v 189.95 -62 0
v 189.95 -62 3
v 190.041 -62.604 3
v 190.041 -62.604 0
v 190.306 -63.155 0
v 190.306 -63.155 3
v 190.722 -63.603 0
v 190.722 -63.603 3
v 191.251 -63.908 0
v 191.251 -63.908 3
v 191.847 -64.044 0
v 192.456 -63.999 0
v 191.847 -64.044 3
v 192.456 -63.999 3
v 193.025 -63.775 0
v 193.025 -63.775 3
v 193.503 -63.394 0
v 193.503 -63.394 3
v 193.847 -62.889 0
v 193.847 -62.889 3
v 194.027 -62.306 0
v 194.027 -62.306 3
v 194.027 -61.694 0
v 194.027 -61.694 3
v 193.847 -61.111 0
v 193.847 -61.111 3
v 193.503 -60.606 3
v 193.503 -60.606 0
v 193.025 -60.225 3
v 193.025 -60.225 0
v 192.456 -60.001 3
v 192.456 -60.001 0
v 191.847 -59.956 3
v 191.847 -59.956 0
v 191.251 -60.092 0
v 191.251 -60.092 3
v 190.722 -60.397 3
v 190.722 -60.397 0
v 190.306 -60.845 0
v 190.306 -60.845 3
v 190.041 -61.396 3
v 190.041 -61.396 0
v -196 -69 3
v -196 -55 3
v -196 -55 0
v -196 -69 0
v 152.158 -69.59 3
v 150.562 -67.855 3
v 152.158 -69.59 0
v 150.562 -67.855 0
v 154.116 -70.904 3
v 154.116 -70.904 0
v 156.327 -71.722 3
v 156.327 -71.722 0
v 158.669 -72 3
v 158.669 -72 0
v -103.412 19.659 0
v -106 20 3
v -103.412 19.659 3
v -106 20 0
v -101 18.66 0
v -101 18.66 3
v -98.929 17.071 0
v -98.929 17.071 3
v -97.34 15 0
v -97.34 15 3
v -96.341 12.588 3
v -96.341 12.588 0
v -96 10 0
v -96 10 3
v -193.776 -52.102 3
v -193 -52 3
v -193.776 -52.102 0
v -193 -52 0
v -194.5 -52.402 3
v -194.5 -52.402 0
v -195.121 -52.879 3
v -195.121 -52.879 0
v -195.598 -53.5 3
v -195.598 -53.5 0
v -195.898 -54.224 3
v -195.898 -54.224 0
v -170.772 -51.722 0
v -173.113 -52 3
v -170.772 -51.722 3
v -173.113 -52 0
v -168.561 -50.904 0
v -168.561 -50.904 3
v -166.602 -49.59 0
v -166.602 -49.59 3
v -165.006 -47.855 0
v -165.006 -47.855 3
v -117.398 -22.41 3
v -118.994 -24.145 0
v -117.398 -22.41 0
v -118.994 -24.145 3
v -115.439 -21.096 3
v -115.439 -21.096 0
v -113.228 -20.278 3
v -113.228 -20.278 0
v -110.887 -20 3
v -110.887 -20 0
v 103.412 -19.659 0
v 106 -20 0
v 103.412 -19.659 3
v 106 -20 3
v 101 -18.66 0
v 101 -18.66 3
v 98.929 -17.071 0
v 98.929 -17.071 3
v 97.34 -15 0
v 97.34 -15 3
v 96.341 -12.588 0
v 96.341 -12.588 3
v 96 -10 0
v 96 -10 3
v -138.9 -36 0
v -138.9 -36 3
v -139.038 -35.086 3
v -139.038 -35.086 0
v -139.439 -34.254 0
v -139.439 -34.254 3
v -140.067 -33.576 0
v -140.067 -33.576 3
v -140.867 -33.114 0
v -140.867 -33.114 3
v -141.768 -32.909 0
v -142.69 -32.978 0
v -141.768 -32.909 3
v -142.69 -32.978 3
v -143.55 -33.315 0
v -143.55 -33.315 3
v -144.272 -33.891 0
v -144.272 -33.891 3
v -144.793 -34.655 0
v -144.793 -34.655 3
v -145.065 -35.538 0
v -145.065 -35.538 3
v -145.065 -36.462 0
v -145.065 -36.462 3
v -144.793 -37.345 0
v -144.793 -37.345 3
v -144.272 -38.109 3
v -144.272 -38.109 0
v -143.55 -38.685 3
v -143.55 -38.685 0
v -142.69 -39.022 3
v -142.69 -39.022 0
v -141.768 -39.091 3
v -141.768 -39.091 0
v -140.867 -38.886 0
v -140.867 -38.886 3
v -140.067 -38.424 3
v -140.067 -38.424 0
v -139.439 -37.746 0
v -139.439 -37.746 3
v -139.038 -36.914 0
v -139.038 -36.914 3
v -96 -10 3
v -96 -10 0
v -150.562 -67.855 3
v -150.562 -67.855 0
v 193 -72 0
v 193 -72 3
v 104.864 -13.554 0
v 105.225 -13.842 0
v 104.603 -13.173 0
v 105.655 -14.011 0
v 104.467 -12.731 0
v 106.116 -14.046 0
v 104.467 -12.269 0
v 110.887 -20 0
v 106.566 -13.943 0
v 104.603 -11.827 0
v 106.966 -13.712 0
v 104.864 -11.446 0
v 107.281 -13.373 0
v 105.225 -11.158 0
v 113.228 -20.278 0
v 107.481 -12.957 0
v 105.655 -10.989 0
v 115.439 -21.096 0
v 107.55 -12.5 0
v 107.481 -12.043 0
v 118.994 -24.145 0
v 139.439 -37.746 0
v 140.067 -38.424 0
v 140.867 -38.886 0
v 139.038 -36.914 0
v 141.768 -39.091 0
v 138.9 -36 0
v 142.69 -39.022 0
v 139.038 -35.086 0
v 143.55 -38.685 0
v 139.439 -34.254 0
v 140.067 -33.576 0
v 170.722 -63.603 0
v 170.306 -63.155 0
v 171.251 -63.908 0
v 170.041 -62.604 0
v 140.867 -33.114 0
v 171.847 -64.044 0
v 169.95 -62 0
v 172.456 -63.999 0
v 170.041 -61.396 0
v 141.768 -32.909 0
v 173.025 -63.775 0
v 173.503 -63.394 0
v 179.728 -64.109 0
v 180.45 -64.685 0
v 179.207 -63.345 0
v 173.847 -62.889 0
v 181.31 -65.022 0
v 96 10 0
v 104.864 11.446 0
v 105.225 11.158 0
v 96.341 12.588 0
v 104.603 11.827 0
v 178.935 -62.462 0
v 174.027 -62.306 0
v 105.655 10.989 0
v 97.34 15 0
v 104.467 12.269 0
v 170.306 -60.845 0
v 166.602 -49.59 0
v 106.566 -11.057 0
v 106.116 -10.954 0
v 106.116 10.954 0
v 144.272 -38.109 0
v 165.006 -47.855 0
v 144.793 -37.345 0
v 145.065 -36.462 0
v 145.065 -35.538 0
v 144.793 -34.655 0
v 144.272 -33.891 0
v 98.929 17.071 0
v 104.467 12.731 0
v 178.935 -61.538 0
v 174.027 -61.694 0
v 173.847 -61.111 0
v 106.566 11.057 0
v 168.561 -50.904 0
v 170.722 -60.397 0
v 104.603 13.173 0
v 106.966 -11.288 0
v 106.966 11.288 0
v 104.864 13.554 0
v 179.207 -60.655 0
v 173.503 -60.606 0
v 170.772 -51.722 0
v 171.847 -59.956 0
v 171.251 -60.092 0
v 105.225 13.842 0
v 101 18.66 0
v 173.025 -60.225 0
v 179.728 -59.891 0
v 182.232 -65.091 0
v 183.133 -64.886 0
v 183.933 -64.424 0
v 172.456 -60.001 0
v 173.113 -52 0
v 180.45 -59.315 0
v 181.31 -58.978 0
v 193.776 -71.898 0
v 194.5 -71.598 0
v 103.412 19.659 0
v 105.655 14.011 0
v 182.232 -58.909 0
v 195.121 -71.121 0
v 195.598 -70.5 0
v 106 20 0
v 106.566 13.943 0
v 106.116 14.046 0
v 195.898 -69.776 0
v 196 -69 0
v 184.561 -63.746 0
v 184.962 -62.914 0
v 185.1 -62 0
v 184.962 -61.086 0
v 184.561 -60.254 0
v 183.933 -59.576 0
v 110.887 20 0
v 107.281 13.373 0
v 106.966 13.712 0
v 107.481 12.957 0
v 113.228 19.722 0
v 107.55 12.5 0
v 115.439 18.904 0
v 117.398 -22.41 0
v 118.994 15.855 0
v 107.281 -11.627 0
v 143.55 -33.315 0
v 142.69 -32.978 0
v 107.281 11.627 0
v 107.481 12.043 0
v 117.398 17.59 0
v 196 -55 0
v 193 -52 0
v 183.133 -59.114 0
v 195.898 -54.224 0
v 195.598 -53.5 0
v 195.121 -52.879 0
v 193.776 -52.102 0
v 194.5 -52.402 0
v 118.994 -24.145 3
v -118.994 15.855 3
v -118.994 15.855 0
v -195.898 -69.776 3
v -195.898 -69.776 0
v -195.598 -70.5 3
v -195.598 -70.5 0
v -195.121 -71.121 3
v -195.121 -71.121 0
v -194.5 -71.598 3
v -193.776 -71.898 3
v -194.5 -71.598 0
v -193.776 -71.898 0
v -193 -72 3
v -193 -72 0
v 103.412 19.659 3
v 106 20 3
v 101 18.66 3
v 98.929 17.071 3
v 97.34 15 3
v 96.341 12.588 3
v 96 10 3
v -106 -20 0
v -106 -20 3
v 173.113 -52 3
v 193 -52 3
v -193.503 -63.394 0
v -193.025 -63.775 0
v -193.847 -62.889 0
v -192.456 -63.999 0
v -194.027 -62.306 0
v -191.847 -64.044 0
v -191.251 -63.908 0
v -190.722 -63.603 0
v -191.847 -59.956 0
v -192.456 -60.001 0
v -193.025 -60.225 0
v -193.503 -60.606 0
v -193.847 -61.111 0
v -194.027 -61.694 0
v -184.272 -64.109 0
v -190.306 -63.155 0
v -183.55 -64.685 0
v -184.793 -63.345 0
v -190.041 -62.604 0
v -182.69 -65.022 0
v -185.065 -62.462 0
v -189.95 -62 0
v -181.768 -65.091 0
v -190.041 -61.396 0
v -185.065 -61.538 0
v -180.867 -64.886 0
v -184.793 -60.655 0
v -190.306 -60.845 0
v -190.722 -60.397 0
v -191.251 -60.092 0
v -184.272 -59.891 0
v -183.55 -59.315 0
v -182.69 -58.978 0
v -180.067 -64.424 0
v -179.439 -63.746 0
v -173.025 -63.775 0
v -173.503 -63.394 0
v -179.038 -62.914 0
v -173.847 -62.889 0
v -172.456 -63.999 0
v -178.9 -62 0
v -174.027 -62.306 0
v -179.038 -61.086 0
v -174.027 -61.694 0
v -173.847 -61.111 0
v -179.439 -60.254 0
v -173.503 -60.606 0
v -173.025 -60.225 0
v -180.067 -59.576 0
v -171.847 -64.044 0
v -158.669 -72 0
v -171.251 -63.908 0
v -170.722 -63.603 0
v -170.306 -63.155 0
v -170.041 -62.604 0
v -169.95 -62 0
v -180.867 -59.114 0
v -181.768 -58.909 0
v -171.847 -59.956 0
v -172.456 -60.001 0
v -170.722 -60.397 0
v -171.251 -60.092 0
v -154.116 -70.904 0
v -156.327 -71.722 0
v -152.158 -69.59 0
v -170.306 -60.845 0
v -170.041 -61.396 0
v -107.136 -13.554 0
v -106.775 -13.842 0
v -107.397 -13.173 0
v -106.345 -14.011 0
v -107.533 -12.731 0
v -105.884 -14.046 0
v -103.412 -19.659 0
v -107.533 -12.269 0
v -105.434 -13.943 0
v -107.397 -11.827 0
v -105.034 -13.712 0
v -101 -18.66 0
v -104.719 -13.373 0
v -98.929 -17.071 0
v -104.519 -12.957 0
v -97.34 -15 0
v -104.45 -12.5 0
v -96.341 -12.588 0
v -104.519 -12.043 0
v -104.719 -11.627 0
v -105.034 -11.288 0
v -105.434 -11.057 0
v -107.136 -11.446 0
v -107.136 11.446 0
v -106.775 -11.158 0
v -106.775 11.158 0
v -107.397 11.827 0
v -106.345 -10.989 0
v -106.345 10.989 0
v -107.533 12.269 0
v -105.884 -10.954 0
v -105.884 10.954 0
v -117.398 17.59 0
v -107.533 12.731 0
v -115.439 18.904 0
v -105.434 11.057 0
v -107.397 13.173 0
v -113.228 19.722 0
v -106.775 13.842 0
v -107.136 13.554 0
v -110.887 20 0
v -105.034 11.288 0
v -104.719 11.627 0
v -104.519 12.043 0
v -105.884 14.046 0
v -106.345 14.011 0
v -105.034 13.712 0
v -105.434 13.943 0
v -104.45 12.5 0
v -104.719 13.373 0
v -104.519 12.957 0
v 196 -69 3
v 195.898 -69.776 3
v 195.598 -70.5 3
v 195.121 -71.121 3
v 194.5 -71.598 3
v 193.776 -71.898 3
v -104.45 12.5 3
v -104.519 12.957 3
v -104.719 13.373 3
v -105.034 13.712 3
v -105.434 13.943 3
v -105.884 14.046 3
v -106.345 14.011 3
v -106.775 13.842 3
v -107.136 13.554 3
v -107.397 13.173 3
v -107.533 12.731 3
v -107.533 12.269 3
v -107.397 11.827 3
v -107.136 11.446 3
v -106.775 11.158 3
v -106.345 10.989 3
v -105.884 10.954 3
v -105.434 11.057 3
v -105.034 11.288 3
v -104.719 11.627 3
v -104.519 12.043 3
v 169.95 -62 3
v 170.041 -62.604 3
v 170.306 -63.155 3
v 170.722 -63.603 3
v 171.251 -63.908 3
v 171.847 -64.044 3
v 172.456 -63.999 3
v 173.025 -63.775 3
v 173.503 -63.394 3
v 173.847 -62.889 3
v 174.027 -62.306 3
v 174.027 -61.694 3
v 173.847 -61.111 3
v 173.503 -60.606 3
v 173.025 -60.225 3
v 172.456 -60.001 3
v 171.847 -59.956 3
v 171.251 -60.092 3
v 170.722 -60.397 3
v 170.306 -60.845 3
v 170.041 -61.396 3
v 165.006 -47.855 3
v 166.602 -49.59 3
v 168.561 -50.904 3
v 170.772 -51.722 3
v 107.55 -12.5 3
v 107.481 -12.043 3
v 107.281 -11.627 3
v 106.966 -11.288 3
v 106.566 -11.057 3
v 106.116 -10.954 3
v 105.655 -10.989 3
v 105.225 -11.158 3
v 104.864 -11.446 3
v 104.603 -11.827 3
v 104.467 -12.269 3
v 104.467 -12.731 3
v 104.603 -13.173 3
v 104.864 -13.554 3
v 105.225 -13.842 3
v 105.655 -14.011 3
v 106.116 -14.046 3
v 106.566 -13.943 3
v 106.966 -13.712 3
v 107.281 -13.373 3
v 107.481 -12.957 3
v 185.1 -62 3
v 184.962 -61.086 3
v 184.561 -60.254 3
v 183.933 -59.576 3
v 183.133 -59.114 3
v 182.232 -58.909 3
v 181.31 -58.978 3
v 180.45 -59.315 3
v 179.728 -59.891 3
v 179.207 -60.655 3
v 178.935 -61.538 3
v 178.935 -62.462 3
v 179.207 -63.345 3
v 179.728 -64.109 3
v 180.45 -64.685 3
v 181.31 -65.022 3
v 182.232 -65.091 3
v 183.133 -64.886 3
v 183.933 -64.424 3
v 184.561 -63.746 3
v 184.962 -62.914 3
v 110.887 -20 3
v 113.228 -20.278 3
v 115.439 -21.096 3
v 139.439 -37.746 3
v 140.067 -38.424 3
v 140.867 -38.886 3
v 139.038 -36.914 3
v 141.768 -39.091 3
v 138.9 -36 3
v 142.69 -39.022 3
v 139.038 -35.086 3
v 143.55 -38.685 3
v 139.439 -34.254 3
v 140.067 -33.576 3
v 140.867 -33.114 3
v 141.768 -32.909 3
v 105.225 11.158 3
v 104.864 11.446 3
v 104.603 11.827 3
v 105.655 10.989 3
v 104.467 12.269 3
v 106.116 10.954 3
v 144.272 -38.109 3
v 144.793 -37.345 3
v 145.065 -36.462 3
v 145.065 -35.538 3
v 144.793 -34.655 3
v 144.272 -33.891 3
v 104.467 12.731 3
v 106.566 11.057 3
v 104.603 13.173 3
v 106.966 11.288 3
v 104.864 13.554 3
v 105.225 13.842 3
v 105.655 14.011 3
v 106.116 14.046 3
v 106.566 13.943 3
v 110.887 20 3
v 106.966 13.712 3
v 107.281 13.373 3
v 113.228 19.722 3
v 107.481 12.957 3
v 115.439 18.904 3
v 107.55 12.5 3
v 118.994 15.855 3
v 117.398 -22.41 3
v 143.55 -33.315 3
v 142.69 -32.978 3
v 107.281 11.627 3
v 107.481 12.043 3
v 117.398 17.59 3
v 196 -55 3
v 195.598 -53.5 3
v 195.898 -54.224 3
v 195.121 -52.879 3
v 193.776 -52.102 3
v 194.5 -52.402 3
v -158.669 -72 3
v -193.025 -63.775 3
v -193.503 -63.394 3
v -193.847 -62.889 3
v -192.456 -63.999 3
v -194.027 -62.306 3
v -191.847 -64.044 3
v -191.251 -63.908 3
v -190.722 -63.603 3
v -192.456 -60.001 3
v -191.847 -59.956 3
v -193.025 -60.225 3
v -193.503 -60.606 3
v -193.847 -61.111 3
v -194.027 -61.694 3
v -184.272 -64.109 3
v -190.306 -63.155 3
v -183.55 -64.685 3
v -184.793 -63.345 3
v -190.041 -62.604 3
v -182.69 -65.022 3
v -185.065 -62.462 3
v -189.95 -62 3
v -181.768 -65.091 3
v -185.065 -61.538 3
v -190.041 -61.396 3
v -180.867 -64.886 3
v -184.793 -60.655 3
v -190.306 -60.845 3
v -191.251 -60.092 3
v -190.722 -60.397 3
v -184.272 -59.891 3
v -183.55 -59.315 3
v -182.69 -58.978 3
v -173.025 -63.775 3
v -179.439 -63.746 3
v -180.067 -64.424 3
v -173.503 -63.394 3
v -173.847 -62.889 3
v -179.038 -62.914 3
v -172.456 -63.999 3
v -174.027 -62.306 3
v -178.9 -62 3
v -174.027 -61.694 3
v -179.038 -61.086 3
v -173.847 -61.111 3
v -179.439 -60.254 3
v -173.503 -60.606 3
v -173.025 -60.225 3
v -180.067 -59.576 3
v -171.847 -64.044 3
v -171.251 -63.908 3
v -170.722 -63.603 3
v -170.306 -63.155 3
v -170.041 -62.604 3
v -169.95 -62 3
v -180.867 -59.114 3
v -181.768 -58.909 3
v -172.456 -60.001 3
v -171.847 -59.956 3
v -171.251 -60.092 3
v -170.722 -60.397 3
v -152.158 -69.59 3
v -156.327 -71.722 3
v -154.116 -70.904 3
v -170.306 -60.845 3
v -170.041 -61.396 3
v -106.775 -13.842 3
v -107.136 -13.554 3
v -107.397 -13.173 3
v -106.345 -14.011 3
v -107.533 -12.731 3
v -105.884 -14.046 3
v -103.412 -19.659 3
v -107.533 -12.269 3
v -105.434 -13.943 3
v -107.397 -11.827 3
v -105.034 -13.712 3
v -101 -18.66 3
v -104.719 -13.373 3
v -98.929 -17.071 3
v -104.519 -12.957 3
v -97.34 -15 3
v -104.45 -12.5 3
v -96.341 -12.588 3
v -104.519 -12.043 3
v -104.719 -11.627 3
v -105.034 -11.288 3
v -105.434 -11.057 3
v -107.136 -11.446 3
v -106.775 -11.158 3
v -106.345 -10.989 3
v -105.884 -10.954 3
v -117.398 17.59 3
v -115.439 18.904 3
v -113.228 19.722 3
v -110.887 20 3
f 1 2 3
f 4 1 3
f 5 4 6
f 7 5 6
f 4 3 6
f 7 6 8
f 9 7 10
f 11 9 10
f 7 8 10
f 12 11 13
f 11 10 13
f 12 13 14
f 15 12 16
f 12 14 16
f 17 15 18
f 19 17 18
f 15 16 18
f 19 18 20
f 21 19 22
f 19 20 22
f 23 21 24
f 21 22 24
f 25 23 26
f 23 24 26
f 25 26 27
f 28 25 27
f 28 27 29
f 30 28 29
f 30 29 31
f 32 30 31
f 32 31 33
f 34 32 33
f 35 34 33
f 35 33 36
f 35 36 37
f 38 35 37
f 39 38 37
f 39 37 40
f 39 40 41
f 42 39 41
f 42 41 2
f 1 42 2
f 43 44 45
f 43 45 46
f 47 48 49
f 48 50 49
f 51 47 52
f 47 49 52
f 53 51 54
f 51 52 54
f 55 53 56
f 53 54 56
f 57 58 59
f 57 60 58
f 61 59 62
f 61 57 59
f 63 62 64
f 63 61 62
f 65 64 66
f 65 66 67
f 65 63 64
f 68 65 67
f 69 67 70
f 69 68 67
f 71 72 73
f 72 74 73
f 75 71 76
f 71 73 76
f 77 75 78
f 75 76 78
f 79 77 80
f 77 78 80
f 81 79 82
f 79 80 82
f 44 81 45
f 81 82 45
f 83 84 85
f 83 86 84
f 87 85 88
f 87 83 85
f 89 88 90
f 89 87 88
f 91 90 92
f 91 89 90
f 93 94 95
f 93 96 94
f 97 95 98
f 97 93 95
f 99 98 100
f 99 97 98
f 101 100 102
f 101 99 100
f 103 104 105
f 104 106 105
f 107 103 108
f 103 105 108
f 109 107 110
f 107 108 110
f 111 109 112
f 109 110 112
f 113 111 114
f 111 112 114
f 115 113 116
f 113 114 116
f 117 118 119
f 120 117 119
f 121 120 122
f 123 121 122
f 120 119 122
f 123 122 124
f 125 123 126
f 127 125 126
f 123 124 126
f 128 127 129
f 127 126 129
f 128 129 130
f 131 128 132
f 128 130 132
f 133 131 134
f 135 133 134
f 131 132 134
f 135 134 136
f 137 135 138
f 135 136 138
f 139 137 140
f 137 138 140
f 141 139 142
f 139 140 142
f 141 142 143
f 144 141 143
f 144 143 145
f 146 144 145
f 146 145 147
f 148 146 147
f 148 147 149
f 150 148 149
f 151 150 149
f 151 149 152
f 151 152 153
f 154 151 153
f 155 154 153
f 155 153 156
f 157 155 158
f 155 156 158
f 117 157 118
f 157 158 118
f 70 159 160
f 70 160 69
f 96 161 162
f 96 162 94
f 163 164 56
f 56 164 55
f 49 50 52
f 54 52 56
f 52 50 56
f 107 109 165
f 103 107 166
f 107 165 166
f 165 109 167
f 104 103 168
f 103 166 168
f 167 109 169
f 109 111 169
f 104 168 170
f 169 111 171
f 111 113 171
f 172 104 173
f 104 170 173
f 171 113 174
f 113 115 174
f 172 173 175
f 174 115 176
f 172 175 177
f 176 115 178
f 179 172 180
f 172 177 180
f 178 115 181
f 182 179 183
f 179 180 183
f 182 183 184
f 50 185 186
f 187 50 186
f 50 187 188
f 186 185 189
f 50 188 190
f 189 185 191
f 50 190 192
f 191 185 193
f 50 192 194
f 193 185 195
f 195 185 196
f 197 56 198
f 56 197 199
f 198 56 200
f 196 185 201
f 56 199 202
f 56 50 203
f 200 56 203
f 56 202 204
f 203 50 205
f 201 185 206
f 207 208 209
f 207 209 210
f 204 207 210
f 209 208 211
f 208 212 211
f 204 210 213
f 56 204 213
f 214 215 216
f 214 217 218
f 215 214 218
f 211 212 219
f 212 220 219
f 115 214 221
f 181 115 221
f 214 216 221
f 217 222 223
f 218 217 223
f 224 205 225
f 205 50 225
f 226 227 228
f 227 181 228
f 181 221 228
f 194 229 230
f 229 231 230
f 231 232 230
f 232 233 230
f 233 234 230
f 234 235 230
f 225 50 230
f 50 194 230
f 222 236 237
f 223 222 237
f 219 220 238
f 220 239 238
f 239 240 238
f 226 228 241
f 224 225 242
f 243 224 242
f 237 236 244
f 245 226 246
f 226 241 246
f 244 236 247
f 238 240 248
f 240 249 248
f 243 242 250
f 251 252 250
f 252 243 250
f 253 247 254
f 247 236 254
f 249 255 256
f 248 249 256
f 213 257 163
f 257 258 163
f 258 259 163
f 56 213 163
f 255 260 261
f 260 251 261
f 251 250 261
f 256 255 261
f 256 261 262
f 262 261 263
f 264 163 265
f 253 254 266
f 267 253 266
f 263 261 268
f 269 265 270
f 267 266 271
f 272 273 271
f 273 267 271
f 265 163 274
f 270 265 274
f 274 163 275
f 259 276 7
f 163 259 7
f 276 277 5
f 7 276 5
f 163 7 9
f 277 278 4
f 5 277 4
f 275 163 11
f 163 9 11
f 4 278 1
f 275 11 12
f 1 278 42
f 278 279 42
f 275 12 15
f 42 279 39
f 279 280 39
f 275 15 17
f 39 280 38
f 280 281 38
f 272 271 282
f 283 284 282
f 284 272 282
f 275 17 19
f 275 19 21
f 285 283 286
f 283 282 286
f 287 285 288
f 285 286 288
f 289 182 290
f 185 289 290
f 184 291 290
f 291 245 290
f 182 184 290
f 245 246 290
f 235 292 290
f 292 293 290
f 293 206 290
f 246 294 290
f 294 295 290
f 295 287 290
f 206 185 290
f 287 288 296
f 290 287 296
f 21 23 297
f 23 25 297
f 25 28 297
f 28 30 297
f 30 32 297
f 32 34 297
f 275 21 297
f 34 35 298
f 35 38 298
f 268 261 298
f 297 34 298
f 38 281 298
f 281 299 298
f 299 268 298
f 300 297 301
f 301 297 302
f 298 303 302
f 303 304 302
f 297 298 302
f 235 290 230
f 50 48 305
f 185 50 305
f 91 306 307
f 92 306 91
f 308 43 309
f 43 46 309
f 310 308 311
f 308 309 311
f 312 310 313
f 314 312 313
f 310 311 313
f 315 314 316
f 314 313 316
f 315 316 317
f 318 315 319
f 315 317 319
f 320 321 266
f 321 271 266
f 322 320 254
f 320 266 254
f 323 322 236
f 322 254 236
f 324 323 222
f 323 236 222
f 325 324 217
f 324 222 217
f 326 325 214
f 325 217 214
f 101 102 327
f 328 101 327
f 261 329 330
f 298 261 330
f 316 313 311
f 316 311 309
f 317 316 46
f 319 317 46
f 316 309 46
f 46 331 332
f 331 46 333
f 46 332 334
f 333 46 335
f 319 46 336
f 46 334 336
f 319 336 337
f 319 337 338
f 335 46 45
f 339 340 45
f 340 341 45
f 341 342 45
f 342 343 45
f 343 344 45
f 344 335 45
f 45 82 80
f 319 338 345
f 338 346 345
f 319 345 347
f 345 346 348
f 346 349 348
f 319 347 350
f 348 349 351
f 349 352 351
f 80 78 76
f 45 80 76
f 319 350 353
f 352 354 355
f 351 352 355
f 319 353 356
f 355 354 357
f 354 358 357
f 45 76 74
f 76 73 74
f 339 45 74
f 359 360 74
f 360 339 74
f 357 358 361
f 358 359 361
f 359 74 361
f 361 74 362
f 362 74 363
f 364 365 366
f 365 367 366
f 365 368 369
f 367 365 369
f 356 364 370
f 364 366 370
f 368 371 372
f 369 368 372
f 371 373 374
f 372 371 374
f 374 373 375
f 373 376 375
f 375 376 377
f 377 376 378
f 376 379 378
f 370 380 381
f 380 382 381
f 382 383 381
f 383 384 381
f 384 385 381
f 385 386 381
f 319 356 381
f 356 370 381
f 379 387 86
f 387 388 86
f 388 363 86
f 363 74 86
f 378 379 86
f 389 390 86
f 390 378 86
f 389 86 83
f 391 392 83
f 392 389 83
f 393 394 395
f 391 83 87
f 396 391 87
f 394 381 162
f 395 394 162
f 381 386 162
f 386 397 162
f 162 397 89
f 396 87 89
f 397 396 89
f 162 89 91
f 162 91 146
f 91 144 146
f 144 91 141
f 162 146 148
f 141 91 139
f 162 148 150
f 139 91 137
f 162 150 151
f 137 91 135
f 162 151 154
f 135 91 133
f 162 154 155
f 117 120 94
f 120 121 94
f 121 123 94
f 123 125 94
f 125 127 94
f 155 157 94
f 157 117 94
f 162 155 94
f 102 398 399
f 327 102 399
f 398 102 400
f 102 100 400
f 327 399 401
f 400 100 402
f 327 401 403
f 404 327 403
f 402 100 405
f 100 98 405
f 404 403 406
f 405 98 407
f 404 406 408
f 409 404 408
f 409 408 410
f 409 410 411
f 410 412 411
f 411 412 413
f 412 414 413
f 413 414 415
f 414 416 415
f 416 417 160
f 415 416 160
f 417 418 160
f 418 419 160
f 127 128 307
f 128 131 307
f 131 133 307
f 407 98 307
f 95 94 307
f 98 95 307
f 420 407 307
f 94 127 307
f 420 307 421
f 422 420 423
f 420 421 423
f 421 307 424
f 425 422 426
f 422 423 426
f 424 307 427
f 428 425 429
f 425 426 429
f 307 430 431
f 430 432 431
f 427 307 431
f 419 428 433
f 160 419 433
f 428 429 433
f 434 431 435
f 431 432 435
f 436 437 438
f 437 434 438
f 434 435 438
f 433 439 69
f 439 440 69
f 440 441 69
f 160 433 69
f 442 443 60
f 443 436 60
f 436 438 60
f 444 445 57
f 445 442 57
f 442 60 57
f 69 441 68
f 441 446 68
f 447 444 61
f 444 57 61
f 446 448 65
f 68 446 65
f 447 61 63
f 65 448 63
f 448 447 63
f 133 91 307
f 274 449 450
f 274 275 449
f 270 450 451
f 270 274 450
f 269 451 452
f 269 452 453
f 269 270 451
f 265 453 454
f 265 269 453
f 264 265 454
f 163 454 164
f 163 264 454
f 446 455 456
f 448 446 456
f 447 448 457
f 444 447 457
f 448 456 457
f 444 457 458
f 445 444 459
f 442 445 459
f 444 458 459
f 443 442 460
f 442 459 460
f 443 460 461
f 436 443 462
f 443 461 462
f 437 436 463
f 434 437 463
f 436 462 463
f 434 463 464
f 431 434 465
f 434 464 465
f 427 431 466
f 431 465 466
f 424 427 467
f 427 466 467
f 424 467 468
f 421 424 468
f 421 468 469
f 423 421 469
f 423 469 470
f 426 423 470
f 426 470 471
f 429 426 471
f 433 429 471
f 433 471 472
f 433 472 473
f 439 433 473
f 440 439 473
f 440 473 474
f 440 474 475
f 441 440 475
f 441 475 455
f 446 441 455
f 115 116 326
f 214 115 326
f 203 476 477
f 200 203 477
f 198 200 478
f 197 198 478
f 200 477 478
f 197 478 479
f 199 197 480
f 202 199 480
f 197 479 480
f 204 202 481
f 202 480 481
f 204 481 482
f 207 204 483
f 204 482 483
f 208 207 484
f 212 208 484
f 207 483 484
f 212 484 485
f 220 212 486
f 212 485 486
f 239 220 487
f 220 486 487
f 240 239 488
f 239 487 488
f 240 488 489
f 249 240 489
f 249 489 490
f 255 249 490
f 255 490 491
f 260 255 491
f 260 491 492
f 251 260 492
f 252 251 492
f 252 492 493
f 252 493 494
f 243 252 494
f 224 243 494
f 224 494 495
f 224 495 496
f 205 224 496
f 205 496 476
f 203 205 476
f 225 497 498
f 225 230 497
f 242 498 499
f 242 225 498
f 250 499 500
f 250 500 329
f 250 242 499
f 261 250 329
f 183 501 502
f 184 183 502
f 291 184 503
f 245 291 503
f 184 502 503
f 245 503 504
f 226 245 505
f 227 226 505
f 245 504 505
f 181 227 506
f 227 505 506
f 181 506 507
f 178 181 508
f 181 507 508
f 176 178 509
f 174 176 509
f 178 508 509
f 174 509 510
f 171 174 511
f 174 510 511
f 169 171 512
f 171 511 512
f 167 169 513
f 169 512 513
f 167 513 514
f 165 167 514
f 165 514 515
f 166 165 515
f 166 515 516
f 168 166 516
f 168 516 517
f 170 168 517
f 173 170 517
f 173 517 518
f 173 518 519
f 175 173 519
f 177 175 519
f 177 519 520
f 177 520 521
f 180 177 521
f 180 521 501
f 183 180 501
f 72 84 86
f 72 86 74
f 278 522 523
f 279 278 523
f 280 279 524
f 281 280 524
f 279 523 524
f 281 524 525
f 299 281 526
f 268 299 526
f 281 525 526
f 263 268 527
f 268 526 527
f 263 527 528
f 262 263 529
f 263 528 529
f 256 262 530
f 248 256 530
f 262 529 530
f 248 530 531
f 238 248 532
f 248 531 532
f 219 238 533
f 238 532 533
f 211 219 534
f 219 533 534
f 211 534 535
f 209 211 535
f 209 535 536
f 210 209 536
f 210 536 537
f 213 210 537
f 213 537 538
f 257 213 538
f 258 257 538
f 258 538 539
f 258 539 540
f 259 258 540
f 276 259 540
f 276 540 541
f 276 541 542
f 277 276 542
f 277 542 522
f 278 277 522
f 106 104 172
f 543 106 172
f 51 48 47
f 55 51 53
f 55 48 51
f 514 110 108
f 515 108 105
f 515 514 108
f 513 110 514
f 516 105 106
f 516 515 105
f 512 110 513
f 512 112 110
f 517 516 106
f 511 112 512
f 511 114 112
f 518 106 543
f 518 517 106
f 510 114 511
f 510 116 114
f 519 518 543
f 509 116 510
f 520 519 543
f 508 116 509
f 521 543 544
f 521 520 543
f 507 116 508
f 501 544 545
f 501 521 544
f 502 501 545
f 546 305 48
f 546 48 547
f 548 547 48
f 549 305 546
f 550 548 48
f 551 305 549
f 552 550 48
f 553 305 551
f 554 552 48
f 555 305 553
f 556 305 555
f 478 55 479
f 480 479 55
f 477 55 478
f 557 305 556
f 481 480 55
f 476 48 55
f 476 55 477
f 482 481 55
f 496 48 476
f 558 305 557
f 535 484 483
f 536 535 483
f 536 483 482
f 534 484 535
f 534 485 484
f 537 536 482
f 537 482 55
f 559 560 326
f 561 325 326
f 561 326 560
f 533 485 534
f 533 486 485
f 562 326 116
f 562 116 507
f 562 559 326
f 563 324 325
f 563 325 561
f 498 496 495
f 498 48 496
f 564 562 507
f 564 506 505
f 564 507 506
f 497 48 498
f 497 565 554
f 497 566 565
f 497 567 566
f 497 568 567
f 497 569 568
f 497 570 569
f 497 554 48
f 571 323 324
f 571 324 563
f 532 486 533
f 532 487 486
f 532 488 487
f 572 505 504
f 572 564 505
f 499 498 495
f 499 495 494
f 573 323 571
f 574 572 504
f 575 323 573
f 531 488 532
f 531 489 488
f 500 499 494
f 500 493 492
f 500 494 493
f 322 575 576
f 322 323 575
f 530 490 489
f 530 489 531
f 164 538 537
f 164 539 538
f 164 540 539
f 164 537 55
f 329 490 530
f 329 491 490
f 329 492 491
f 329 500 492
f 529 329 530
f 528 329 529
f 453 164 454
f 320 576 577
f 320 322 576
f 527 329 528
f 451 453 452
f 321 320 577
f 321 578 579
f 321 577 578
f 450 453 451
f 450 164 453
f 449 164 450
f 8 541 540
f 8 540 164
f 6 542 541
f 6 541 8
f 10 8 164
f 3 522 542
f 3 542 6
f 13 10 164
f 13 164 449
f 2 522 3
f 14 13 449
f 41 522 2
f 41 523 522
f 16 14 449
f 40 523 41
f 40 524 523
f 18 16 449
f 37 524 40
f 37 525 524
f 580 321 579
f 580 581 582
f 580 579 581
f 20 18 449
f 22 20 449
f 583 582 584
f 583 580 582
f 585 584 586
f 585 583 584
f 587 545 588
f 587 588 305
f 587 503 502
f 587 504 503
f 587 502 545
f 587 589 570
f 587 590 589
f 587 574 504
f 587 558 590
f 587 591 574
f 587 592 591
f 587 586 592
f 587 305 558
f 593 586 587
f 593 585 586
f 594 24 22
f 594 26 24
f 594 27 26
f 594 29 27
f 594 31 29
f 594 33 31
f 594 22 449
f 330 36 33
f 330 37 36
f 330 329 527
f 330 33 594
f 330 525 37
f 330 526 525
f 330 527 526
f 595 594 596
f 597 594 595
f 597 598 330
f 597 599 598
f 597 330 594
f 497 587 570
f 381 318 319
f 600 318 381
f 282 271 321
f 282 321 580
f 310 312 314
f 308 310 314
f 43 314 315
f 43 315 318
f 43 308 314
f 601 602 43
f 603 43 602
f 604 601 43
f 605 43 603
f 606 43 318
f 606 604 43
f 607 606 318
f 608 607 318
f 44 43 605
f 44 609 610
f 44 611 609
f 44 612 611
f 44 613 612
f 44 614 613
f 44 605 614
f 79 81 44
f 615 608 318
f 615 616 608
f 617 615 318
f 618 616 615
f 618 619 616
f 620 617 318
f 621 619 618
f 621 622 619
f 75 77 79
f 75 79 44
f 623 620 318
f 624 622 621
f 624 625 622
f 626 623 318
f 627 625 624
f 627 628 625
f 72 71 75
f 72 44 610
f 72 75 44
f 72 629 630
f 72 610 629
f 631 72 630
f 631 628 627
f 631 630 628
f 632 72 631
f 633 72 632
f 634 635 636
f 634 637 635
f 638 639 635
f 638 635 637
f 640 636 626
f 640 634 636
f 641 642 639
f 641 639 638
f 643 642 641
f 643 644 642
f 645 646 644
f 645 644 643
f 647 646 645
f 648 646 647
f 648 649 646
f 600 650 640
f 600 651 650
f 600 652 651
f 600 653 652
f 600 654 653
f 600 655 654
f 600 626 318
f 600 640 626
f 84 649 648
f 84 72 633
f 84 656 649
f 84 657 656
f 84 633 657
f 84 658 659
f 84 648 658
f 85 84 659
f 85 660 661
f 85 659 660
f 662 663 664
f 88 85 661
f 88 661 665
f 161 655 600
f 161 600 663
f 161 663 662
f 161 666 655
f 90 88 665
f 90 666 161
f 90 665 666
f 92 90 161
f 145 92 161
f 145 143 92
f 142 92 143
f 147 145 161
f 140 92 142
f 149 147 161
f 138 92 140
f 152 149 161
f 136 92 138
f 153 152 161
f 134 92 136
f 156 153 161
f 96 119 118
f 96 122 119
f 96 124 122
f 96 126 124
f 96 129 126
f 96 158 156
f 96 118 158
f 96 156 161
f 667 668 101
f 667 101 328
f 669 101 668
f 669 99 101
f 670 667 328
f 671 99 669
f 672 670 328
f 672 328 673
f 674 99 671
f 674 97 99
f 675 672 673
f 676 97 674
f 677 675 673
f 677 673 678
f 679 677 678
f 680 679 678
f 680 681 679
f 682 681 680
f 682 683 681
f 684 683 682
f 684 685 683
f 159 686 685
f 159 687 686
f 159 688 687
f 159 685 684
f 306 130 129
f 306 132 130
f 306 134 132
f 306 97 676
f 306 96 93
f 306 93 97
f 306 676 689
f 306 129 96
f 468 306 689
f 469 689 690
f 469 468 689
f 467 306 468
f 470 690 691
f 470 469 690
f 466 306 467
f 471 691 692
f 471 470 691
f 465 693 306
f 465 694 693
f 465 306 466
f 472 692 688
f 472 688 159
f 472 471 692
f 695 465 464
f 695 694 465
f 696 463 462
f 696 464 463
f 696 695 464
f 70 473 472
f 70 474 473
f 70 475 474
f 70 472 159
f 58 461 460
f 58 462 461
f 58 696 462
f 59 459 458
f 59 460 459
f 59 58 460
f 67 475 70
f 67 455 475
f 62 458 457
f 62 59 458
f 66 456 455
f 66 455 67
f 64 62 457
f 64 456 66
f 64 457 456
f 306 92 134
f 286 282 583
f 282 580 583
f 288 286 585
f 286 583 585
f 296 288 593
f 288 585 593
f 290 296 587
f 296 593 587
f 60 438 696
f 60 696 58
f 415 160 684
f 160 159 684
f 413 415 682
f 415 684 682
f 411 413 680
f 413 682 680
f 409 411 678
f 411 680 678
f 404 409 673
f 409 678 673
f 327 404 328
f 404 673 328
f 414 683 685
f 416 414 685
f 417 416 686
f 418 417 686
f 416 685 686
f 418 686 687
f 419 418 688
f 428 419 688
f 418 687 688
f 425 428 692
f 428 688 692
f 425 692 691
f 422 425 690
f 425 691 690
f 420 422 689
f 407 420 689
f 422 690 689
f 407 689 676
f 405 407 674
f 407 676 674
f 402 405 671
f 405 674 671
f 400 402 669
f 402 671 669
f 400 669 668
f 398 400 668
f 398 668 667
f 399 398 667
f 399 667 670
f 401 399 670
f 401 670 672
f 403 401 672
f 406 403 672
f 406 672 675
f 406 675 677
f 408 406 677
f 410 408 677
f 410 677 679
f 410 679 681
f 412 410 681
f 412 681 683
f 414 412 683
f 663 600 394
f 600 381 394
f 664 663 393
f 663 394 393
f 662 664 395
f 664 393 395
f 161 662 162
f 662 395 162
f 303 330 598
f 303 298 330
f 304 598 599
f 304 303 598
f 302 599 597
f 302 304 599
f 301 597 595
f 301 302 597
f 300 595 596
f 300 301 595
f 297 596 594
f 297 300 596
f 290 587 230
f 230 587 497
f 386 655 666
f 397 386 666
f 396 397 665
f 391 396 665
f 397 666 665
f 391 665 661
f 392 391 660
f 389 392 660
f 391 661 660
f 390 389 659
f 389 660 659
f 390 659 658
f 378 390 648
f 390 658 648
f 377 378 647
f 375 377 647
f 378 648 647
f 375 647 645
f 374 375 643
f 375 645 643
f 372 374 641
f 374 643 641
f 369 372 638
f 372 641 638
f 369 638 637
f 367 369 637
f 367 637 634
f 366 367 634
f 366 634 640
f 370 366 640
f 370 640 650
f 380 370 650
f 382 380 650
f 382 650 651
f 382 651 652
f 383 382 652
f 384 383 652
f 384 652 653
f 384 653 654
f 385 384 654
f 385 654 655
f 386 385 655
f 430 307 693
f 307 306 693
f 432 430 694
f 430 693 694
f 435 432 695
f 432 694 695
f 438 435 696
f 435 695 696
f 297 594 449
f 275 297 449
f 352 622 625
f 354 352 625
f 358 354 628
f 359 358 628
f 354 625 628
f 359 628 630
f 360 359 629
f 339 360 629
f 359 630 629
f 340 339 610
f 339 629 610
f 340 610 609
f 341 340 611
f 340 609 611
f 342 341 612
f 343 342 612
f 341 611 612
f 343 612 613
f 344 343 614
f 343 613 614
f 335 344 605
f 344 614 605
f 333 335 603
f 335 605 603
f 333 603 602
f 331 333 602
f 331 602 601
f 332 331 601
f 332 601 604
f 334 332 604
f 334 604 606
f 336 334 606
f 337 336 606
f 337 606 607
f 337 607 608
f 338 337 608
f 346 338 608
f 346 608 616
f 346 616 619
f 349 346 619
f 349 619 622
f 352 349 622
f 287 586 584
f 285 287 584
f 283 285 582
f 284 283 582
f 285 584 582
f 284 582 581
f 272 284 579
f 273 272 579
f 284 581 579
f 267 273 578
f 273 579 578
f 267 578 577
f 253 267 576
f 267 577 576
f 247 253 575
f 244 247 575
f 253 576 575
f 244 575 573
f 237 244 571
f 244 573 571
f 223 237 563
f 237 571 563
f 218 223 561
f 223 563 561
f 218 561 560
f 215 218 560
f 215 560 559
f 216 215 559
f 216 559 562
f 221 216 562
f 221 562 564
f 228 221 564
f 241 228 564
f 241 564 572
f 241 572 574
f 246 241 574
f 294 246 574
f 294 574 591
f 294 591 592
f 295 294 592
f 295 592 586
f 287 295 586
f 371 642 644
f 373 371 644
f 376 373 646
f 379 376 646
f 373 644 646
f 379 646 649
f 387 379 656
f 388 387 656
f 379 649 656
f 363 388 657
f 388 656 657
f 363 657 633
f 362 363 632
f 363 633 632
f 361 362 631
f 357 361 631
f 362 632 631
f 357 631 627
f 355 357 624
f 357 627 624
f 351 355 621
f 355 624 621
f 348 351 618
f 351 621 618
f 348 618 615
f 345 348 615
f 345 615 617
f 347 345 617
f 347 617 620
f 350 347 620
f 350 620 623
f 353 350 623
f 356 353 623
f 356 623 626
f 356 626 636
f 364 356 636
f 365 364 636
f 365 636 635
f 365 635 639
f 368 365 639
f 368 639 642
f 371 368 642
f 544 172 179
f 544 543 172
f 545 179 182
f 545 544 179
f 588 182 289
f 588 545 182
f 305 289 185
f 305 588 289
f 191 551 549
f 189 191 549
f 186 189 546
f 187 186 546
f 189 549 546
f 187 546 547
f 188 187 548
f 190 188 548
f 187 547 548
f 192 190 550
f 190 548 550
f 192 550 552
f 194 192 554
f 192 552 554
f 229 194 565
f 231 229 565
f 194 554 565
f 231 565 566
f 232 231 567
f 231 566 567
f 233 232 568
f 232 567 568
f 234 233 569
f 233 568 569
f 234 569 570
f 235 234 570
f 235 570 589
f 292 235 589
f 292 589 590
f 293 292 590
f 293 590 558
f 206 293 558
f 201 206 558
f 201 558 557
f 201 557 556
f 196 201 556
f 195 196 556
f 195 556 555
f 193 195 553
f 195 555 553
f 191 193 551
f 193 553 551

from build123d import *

# Parameters (mm, degrees)
SKETCH_1_W          = 232
SKETCH_1_H          = 40
SKETCH_1_R          = 2.1
EXTRUDE_1_DEPTH     = 3
SKETCH_2_R          = 3.1
EXTRUDE_2_DEPTH     = 3
SKETCH_4_R          = 1.55
CUT_EXTRUDE_2_DEPTH = 10
FILLET_1_R          = 3
FILLET_2_R          = 10
SKETCH_5_W          = 192
SKETCH_5_H          = 40
CUT_EXTRUDE_3_DEPTH = 5
FILLET_3_R          = 10
FILLET_4_R          = 10
SKETCH_6_R          = 2.05
SKETCH_6_R_2        = 3.1
CUT_EXTRUDE_4_DEPTH = 209.827680158


with BuildPart() as part:
    # 草图1 → 凸台-拉伸1 (new body)
    with BuildSketch(Plane.XY):
        Rectangle(SKETCH_1_W, SKETCH_1_H)
        with Locations((-47.5, 12.5)):
            Circle(SKETCH_1_R, mode=Mode.SUBTRACT)
        with Locations((47.5, 12.5)):
            Circle(SKETCH_1_R, mode=Mode.SUBTRACT)
        with Locations((-47.5, -12.5)):
            Circle(SKETCH_1_R, mode=Mode.SUBTRACT)
        with Locations((47.5, -12.5)):
            Circle(SKETCH_1_R, mode=Mode.SUBTRACT)
    extrude(amount=EXTRUDE_1_DEPTH)

    # 草图2 → 凸台-拉伸2 (add)
    # profile 1 of 2: a face of its own
    with BuildSketch(Plane.XY.offset(3)):
        Polygon((-116, 20), (-168, -52), (-196, -52), (-196, -72), (-153.555555556, -72), (-116, -20), align=None)
        with Locations((-142, -36)):
            Circle(SKETCH_2_R, mode=Mode.SUBTRACT)
    # profile 2 of 2: a face of its own
    with BuildSketch(Plane.XY.offset(3)):
        Polygon((116, 20), (168, -52), (196, -52), (196, -72), (153.555555556, -72), (116, -20), align=None)
        with Locations(Location((142, -36, 0), (0, 0, 180))):
            Circle(SKETCH_2_R, mode=Mode.SUBTRACT)
    extrude(amount=-EXTRUDE_2_DEPTH)

    # 草图4 → 切除-拉伸2 (cut)
    with BuildSketch(Plane.XY.offset(3)):
        with Locations((-106, 12.5)):
            Circle(SKETCH_4_R)
        with Locations((-106, -12.5)):
            Circle(SKETCH_4_R)
        with Locations((106, 12.5)):
            Circle(SKETCH_4_R)
        with Locations((106, -12.5)):
            Circle(SKETCH_4_R)
    extrude(amount=-CUT_EXTRUDE_2_DEPTH, mode=Mode.SUBTRACT)

    # 圆角1
    fillet_1_edges = [part.edges().sort_by_distance(p)[0] for p in [
        (-196, -72, 1.5),
        (-196, -52, 1.5),
        (196, -52, 1.5),
        (196, -72, 1.5),
    ]]
    fillet(fillet_1_edges, radius=FILLET_1_R)

    # 圆角2
    fillet_2_edges = [part.edges().sort_by_distance(p)[0] for p in [
        (-153.555555556, -72, 1.5),
        (-168, -52, 1.5),
        (168, -52, 1.5),
        (153.555555556, -72, 1.5),
        (116, -20, 1.5),
        (-116, -20, 1.5),
        (-116, 20, 1.5),
        (116, 20, 1.5),
    ]]
    fillet(fillet_2_edges, radius=FILLET_2_R)

    # 草图5 → 切除-拉伸3 (cut, symmetric)
    with BuildSketch(Plane.XY.offset(3)):
        Rectangle(SKETCH_5_W, SKETCH_5_H)
    extrude(amount=CUT_EXTRUDE_3_DEPTH, both=True, mode=Mode.SUBTRACT)


with BuildPart() as cut_extrude_3_piece_1:
    # of the separate pieces the step leaves, piece 1, a body of its own (cut_extrude_3_pieces)
    add(part.part.solids().sort_by_distance((96, 20, 0))[0])

    # 圆角4
    fillet_4_edges = [cut_extrude_3_piece_1.edges().sort_by_distance(p)[0] for p in [
        (96, -20, 1.5),
        (96, 20, 1.5),
    ]]
    fillet(fillet_4_edges, radius=FILLET_4_R)


with BuildPart() as cut_extrude_3_piece_2:
    # of the separate pieces the step leaves, piece 2, a body of its own (cut_extrude_3_pieces)
    add(part.part.solids().sort_by_distance((-158.668668506, -72, 0))[0])

    # 圆角3
    fillet_3_edges = [cut_extrude_3_piece_2.edges().sort_by_distance(p)[0] for p in [
        (-96, -20, 1.5),
        (-96, 20, 1.5),
    ]]
    fillet(fillet_3_edges, radius=FILLET_3_R)


with BuildPart() as cut_extrude_4_tool:
    # 草图6 → 切除-拉伸4 (new, through all)
    with BuildSketch(Plane.XY.offset(3)):
        with Locations((-192, -62)):
            Circle(SKETCH_6_R)
        with Locations((-172, -62)):
            Circle(SKETCH_6_R)
        with Locations(Location((172, -62, 0), (0, 0, 180))):
            Circle(SKETCH_6_R)
        with Locations(Location((192, -62, 0), (0, 0, 180))):
            Circle(SKETCH_6_R)
        with Locations((-182, -62)):
            Circle(SKETCH_6_R_2)
        with Locations((182, -62)):
            Circle(SKETCH_6_R_2)
    extrude(amount=-CUT_EXTRUDE_4_DEPTH)


with BuildPart() as cut_extrude_3_piece_1_1:
    add(cut_extrude_3_piece_1.part)

    # 切除-拉伸4: cut by cut_extrude_4_tool
    add(cut_extrude_4_tool.part, mode=Mode.SUBTRACT)


with BuildPart() as cut_extrude_3_piece_2_1:
    add(cut_extrude_3_piece_2.part)

    # 切除-拉伸4: cut by cut_extrude_4_tool
    add(cut_extrude_4_tool.part, mode=Mode.SUBTRACT)


solid = Compound([cut_extrude_3_piece_1_1.part, cut_extrude_3_piece_2_1.part])
